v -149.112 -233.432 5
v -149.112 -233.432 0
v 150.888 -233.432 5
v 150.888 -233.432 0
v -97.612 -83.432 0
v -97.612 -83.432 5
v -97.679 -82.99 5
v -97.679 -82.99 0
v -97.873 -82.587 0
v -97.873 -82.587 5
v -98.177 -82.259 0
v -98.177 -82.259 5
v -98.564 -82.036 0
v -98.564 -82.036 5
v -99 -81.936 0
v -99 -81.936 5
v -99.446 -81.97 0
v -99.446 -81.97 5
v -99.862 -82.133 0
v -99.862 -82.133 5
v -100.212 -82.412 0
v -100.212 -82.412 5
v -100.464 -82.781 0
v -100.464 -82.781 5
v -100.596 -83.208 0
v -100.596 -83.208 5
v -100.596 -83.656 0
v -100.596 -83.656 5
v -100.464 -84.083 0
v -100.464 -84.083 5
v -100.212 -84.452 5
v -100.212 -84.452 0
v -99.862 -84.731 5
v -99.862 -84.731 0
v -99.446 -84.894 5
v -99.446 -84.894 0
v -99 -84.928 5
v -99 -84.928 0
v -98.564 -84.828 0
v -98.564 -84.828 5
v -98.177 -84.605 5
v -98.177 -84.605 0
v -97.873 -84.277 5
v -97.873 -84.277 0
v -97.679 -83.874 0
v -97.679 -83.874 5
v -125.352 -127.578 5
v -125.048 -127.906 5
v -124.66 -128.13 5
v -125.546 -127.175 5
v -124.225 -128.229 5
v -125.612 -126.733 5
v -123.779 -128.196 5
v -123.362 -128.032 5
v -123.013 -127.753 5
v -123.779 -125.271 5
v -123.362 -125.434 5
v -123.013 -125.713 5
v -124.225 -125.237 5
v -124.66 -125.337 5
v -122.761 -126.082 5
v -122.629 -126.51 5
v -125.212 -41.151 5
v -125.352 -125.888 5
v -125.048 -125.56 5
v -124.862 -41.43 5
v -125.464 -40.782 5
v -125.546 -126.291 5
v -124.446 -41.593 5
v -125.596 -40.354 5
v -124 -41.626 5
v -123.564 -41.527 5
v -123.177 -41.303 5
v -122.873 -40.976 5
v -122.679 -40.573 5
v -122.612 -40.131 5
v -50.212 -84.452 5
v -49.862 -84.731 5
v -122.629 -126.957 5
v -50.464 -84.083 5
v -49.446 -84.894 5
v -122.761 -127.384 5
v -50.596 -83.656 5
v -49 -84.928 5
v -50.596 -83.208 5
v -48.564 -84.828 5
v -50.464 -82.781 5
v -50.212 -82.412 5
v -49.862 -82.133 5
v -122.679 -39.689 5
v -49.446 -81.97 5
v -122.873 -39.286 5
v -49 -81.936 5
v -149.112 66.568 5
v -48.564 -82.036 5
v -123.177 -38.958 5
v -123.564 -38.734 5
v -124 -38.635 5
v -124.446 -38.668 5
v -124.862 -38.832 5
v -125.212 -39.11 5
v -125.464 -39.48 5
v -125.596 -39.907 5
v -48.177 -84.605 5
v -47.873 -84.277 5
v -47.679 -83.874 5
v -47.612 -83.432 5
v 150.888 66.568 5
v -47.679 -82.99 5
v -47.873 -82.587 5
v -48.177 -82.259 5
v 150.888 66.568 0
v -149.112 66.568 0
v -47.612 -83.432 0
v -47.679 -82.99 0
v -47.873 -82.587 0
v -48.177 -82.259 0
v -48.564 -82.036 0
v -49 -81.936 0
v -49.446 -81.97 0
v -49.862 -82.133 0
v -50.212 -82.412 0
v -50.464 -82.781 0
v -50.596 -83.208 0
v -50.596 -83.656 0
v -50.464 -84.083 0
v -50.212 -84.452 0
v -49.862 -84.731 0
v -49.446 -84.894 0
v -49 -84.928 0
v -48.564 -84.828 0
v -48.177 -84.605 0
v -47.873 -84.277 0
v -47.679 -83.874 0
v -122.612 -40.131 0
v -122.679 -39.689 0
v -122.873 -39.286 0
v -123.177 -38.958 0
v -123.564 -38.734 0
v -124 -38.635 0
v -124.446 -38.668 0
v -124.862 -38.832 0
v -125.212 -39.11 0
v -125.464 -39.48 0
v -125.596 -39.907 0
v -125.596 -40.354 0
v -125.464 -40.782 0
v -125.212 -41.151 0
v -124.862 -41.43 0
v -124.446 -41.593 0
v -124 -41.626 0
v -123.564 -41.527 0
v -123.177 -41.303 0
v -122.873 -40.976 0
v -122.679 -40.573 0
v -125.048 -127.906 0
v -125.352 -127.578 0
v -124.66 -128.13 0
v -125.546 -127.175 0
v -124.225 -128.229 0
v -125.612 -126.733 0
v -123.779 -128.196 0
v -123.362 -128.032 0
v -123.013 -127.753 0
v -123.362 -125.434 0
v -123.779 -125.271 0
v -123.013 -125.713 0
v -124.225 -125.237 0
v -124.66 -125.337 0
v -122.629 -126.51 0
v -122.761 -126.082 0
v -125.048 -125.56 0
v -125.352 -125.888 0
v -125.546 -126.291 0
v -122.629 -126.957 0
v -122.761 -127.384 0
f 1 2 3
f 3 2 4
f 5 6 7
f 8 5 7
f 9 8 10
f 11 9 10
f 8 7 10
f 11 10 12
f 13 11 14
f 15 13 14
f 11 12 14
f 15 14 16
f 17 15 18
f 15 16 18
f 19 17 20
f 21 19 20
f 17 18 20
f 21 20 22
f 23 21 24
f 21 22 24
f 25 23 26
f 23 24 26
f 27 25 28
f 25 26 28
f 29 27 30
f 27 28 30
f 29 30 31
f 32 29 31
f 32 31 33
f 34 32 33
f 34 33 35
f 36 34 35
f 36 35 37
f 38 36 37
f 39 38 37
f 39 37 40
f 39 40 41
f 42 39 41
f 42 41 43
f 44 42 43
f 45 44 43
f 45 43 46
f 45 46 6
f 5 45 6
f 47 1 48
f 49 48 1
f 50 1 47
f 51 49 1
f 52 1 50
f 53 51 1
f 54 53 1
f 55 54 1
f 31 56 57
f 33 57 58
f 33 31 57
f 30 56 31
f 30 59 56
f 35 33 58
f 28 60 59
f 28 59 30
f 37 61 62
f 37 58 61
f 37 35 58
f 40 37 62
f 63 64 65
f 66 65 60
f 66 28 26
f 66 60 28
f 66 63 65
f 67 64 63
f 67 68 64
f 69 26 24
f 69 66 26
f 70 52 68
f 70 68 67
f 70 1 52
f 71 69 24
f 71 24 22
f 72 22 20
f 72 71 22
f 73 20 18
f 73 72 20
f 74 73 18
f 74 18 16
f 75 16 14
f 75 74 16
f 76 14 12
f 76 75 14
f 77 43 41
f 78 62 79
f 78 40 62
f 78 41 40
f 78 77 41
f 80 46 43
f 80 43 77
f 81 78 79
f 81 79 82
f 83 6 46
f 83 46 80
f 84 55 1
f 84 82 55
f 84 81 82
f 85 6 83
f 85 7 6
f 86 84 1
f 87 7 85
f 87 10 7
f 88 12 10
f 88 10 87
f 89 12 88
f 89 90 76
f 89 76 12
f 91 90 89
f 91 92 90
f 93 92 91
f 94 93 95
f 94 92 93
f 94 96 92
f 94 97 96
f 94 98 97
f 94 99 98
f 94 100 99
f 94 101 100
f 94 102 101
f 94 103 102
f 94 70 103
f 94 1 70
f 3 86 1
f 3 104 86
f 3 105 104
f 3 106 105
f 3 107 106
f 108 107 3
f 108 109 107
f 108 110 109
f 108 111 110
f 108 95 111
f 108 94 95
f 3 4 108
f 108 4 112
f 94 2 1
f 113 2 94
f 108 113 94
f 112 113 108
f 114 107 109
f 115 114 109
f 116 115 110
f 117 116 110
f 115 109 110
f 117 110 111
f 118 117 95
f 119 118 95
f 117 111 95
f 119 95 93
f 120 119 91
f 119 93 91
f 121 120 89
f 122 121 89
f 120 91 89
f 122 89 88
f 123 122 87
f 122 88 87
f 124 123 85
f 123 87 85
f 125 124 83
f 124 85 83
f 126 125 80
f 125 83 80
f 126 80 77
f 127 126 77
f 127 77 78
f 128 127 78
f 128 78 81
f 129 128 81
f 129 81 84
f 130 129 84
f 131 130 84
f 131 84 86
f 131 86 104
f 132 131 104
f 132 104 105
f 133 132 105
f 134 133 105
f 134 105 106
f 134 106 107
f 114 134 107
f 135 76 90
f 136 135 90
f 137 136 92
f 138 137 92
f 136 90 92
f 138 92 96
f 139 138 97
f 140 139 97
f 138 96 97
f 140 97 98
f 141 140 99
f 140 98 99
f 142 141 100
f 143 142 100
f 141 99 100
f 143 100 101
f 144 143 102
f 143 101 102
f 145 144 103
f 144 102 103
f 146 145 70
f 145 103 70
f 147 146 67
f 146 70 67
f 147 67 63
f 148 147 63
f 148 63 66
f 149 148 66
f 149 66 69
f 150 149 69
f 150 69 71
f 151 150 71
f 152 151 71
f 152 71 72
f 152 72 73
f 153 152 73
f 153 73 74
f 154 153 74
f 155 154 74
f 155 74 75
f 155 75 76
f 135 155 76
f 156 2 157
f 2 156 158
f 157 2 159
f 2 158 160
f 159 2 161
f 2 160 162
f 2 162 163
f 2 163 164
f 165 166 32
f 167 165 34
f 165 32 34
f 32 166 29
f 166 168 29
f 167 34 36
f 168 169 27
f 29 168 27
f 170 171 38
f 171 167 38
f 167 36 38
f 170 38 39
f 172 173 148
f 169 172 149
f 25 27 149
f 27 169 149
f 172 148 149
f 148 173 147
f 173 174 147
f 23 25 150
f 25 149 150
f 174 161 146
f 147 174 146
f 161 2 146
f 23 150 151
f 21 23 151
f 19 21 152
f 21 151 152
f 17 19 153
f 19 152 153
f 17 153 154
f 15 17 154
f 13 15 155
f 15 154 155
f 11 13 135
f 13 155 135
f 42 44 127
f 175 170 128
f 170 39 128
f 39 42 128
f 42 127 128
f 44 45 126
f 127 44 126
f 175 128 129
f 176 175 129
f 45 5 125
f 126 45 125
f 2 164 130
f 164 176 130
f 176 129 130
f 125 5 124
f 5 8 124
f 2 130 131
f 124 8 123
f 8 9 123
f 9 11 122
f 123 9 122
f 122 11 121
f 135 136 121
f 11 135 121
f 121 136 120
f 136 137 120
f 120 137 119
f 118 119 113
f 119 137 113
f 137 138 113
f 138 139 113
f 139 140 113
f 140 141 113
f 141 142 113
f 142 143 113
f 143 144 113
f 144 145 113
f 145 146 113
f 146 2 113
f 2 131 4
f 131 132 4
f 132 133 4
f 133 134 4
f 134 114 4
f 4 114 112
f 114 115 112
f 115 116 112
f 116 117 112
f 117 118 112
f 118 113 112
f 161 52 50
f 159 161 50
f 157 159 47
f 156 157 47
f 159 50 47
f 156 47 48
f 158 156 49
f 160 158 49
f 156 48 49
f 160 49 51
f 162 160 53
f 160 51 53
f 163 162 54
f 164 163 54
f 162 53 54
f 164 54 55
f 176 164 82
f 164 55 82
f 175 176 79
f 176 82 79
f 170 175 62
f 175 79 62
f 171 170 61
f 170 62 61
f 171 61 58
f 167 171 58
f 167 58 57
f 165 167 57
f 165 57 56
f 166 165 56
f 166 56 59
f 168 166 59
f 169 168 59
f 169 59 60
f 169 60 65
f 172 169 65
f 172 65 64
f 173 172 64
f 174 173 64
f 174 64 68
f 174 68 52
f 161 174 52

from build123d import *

# Parameters (mm, degrees)
SKETCH1_W           = 300
SKETCH1_H           = 300
BOSS_EXTRUDE1_DEPTH = 5
SKETCH5_R           = 1.5
CUT_EXTRUDE3_DEPTH  = 278.997367795
SKETCH6_R           = 1.5
CUT_EXTRUDE5_DEPTH  = 278.997367795


with BuildPart() as part:
    # Sketch1 → Boss-Extrude1 (new body)
    with BuildSketch(Plane.XY):
        with Locations((0.887573964, -83.431952663)):
            Rectangle(SKETCH1_W, SKETCH1_H)
    extrude(amount=BOSS_EXTRUDE1_DEPTH)

    # Sketch5 → Cut-Extrude3 (cut, through all)
    with BuildSketch(Plane.XY.offset(5)):
        with Locations((-99.112426036, -83.431952663)):
            Circle(SKETCH5_R)
    extrude(amount=-CUT_EXTRUDE3_DEPTH, mode=Mode.SUBTRACT)

    # Sketch6 → Cut-Extrude5 (cut, through all)
    with BuildSketch(Plane.XY.offset(5)):
        with Locations((-49.112426036, -83.431952663)):
            Circle(SKETCH6_R)
        with Locations((-124.112426036, -40.130682474)):
            Circle(SKETCH6_R)
        with Locations(Location((-124.112426036, -126.733222852, 0), (0, 0, 180))):
            Circle(SKETCH6_R)
    extrude(amount=-CUT_EXTRUDE5_DEPTH, mode=Mode.SUBTRACT)


solid = part.part
